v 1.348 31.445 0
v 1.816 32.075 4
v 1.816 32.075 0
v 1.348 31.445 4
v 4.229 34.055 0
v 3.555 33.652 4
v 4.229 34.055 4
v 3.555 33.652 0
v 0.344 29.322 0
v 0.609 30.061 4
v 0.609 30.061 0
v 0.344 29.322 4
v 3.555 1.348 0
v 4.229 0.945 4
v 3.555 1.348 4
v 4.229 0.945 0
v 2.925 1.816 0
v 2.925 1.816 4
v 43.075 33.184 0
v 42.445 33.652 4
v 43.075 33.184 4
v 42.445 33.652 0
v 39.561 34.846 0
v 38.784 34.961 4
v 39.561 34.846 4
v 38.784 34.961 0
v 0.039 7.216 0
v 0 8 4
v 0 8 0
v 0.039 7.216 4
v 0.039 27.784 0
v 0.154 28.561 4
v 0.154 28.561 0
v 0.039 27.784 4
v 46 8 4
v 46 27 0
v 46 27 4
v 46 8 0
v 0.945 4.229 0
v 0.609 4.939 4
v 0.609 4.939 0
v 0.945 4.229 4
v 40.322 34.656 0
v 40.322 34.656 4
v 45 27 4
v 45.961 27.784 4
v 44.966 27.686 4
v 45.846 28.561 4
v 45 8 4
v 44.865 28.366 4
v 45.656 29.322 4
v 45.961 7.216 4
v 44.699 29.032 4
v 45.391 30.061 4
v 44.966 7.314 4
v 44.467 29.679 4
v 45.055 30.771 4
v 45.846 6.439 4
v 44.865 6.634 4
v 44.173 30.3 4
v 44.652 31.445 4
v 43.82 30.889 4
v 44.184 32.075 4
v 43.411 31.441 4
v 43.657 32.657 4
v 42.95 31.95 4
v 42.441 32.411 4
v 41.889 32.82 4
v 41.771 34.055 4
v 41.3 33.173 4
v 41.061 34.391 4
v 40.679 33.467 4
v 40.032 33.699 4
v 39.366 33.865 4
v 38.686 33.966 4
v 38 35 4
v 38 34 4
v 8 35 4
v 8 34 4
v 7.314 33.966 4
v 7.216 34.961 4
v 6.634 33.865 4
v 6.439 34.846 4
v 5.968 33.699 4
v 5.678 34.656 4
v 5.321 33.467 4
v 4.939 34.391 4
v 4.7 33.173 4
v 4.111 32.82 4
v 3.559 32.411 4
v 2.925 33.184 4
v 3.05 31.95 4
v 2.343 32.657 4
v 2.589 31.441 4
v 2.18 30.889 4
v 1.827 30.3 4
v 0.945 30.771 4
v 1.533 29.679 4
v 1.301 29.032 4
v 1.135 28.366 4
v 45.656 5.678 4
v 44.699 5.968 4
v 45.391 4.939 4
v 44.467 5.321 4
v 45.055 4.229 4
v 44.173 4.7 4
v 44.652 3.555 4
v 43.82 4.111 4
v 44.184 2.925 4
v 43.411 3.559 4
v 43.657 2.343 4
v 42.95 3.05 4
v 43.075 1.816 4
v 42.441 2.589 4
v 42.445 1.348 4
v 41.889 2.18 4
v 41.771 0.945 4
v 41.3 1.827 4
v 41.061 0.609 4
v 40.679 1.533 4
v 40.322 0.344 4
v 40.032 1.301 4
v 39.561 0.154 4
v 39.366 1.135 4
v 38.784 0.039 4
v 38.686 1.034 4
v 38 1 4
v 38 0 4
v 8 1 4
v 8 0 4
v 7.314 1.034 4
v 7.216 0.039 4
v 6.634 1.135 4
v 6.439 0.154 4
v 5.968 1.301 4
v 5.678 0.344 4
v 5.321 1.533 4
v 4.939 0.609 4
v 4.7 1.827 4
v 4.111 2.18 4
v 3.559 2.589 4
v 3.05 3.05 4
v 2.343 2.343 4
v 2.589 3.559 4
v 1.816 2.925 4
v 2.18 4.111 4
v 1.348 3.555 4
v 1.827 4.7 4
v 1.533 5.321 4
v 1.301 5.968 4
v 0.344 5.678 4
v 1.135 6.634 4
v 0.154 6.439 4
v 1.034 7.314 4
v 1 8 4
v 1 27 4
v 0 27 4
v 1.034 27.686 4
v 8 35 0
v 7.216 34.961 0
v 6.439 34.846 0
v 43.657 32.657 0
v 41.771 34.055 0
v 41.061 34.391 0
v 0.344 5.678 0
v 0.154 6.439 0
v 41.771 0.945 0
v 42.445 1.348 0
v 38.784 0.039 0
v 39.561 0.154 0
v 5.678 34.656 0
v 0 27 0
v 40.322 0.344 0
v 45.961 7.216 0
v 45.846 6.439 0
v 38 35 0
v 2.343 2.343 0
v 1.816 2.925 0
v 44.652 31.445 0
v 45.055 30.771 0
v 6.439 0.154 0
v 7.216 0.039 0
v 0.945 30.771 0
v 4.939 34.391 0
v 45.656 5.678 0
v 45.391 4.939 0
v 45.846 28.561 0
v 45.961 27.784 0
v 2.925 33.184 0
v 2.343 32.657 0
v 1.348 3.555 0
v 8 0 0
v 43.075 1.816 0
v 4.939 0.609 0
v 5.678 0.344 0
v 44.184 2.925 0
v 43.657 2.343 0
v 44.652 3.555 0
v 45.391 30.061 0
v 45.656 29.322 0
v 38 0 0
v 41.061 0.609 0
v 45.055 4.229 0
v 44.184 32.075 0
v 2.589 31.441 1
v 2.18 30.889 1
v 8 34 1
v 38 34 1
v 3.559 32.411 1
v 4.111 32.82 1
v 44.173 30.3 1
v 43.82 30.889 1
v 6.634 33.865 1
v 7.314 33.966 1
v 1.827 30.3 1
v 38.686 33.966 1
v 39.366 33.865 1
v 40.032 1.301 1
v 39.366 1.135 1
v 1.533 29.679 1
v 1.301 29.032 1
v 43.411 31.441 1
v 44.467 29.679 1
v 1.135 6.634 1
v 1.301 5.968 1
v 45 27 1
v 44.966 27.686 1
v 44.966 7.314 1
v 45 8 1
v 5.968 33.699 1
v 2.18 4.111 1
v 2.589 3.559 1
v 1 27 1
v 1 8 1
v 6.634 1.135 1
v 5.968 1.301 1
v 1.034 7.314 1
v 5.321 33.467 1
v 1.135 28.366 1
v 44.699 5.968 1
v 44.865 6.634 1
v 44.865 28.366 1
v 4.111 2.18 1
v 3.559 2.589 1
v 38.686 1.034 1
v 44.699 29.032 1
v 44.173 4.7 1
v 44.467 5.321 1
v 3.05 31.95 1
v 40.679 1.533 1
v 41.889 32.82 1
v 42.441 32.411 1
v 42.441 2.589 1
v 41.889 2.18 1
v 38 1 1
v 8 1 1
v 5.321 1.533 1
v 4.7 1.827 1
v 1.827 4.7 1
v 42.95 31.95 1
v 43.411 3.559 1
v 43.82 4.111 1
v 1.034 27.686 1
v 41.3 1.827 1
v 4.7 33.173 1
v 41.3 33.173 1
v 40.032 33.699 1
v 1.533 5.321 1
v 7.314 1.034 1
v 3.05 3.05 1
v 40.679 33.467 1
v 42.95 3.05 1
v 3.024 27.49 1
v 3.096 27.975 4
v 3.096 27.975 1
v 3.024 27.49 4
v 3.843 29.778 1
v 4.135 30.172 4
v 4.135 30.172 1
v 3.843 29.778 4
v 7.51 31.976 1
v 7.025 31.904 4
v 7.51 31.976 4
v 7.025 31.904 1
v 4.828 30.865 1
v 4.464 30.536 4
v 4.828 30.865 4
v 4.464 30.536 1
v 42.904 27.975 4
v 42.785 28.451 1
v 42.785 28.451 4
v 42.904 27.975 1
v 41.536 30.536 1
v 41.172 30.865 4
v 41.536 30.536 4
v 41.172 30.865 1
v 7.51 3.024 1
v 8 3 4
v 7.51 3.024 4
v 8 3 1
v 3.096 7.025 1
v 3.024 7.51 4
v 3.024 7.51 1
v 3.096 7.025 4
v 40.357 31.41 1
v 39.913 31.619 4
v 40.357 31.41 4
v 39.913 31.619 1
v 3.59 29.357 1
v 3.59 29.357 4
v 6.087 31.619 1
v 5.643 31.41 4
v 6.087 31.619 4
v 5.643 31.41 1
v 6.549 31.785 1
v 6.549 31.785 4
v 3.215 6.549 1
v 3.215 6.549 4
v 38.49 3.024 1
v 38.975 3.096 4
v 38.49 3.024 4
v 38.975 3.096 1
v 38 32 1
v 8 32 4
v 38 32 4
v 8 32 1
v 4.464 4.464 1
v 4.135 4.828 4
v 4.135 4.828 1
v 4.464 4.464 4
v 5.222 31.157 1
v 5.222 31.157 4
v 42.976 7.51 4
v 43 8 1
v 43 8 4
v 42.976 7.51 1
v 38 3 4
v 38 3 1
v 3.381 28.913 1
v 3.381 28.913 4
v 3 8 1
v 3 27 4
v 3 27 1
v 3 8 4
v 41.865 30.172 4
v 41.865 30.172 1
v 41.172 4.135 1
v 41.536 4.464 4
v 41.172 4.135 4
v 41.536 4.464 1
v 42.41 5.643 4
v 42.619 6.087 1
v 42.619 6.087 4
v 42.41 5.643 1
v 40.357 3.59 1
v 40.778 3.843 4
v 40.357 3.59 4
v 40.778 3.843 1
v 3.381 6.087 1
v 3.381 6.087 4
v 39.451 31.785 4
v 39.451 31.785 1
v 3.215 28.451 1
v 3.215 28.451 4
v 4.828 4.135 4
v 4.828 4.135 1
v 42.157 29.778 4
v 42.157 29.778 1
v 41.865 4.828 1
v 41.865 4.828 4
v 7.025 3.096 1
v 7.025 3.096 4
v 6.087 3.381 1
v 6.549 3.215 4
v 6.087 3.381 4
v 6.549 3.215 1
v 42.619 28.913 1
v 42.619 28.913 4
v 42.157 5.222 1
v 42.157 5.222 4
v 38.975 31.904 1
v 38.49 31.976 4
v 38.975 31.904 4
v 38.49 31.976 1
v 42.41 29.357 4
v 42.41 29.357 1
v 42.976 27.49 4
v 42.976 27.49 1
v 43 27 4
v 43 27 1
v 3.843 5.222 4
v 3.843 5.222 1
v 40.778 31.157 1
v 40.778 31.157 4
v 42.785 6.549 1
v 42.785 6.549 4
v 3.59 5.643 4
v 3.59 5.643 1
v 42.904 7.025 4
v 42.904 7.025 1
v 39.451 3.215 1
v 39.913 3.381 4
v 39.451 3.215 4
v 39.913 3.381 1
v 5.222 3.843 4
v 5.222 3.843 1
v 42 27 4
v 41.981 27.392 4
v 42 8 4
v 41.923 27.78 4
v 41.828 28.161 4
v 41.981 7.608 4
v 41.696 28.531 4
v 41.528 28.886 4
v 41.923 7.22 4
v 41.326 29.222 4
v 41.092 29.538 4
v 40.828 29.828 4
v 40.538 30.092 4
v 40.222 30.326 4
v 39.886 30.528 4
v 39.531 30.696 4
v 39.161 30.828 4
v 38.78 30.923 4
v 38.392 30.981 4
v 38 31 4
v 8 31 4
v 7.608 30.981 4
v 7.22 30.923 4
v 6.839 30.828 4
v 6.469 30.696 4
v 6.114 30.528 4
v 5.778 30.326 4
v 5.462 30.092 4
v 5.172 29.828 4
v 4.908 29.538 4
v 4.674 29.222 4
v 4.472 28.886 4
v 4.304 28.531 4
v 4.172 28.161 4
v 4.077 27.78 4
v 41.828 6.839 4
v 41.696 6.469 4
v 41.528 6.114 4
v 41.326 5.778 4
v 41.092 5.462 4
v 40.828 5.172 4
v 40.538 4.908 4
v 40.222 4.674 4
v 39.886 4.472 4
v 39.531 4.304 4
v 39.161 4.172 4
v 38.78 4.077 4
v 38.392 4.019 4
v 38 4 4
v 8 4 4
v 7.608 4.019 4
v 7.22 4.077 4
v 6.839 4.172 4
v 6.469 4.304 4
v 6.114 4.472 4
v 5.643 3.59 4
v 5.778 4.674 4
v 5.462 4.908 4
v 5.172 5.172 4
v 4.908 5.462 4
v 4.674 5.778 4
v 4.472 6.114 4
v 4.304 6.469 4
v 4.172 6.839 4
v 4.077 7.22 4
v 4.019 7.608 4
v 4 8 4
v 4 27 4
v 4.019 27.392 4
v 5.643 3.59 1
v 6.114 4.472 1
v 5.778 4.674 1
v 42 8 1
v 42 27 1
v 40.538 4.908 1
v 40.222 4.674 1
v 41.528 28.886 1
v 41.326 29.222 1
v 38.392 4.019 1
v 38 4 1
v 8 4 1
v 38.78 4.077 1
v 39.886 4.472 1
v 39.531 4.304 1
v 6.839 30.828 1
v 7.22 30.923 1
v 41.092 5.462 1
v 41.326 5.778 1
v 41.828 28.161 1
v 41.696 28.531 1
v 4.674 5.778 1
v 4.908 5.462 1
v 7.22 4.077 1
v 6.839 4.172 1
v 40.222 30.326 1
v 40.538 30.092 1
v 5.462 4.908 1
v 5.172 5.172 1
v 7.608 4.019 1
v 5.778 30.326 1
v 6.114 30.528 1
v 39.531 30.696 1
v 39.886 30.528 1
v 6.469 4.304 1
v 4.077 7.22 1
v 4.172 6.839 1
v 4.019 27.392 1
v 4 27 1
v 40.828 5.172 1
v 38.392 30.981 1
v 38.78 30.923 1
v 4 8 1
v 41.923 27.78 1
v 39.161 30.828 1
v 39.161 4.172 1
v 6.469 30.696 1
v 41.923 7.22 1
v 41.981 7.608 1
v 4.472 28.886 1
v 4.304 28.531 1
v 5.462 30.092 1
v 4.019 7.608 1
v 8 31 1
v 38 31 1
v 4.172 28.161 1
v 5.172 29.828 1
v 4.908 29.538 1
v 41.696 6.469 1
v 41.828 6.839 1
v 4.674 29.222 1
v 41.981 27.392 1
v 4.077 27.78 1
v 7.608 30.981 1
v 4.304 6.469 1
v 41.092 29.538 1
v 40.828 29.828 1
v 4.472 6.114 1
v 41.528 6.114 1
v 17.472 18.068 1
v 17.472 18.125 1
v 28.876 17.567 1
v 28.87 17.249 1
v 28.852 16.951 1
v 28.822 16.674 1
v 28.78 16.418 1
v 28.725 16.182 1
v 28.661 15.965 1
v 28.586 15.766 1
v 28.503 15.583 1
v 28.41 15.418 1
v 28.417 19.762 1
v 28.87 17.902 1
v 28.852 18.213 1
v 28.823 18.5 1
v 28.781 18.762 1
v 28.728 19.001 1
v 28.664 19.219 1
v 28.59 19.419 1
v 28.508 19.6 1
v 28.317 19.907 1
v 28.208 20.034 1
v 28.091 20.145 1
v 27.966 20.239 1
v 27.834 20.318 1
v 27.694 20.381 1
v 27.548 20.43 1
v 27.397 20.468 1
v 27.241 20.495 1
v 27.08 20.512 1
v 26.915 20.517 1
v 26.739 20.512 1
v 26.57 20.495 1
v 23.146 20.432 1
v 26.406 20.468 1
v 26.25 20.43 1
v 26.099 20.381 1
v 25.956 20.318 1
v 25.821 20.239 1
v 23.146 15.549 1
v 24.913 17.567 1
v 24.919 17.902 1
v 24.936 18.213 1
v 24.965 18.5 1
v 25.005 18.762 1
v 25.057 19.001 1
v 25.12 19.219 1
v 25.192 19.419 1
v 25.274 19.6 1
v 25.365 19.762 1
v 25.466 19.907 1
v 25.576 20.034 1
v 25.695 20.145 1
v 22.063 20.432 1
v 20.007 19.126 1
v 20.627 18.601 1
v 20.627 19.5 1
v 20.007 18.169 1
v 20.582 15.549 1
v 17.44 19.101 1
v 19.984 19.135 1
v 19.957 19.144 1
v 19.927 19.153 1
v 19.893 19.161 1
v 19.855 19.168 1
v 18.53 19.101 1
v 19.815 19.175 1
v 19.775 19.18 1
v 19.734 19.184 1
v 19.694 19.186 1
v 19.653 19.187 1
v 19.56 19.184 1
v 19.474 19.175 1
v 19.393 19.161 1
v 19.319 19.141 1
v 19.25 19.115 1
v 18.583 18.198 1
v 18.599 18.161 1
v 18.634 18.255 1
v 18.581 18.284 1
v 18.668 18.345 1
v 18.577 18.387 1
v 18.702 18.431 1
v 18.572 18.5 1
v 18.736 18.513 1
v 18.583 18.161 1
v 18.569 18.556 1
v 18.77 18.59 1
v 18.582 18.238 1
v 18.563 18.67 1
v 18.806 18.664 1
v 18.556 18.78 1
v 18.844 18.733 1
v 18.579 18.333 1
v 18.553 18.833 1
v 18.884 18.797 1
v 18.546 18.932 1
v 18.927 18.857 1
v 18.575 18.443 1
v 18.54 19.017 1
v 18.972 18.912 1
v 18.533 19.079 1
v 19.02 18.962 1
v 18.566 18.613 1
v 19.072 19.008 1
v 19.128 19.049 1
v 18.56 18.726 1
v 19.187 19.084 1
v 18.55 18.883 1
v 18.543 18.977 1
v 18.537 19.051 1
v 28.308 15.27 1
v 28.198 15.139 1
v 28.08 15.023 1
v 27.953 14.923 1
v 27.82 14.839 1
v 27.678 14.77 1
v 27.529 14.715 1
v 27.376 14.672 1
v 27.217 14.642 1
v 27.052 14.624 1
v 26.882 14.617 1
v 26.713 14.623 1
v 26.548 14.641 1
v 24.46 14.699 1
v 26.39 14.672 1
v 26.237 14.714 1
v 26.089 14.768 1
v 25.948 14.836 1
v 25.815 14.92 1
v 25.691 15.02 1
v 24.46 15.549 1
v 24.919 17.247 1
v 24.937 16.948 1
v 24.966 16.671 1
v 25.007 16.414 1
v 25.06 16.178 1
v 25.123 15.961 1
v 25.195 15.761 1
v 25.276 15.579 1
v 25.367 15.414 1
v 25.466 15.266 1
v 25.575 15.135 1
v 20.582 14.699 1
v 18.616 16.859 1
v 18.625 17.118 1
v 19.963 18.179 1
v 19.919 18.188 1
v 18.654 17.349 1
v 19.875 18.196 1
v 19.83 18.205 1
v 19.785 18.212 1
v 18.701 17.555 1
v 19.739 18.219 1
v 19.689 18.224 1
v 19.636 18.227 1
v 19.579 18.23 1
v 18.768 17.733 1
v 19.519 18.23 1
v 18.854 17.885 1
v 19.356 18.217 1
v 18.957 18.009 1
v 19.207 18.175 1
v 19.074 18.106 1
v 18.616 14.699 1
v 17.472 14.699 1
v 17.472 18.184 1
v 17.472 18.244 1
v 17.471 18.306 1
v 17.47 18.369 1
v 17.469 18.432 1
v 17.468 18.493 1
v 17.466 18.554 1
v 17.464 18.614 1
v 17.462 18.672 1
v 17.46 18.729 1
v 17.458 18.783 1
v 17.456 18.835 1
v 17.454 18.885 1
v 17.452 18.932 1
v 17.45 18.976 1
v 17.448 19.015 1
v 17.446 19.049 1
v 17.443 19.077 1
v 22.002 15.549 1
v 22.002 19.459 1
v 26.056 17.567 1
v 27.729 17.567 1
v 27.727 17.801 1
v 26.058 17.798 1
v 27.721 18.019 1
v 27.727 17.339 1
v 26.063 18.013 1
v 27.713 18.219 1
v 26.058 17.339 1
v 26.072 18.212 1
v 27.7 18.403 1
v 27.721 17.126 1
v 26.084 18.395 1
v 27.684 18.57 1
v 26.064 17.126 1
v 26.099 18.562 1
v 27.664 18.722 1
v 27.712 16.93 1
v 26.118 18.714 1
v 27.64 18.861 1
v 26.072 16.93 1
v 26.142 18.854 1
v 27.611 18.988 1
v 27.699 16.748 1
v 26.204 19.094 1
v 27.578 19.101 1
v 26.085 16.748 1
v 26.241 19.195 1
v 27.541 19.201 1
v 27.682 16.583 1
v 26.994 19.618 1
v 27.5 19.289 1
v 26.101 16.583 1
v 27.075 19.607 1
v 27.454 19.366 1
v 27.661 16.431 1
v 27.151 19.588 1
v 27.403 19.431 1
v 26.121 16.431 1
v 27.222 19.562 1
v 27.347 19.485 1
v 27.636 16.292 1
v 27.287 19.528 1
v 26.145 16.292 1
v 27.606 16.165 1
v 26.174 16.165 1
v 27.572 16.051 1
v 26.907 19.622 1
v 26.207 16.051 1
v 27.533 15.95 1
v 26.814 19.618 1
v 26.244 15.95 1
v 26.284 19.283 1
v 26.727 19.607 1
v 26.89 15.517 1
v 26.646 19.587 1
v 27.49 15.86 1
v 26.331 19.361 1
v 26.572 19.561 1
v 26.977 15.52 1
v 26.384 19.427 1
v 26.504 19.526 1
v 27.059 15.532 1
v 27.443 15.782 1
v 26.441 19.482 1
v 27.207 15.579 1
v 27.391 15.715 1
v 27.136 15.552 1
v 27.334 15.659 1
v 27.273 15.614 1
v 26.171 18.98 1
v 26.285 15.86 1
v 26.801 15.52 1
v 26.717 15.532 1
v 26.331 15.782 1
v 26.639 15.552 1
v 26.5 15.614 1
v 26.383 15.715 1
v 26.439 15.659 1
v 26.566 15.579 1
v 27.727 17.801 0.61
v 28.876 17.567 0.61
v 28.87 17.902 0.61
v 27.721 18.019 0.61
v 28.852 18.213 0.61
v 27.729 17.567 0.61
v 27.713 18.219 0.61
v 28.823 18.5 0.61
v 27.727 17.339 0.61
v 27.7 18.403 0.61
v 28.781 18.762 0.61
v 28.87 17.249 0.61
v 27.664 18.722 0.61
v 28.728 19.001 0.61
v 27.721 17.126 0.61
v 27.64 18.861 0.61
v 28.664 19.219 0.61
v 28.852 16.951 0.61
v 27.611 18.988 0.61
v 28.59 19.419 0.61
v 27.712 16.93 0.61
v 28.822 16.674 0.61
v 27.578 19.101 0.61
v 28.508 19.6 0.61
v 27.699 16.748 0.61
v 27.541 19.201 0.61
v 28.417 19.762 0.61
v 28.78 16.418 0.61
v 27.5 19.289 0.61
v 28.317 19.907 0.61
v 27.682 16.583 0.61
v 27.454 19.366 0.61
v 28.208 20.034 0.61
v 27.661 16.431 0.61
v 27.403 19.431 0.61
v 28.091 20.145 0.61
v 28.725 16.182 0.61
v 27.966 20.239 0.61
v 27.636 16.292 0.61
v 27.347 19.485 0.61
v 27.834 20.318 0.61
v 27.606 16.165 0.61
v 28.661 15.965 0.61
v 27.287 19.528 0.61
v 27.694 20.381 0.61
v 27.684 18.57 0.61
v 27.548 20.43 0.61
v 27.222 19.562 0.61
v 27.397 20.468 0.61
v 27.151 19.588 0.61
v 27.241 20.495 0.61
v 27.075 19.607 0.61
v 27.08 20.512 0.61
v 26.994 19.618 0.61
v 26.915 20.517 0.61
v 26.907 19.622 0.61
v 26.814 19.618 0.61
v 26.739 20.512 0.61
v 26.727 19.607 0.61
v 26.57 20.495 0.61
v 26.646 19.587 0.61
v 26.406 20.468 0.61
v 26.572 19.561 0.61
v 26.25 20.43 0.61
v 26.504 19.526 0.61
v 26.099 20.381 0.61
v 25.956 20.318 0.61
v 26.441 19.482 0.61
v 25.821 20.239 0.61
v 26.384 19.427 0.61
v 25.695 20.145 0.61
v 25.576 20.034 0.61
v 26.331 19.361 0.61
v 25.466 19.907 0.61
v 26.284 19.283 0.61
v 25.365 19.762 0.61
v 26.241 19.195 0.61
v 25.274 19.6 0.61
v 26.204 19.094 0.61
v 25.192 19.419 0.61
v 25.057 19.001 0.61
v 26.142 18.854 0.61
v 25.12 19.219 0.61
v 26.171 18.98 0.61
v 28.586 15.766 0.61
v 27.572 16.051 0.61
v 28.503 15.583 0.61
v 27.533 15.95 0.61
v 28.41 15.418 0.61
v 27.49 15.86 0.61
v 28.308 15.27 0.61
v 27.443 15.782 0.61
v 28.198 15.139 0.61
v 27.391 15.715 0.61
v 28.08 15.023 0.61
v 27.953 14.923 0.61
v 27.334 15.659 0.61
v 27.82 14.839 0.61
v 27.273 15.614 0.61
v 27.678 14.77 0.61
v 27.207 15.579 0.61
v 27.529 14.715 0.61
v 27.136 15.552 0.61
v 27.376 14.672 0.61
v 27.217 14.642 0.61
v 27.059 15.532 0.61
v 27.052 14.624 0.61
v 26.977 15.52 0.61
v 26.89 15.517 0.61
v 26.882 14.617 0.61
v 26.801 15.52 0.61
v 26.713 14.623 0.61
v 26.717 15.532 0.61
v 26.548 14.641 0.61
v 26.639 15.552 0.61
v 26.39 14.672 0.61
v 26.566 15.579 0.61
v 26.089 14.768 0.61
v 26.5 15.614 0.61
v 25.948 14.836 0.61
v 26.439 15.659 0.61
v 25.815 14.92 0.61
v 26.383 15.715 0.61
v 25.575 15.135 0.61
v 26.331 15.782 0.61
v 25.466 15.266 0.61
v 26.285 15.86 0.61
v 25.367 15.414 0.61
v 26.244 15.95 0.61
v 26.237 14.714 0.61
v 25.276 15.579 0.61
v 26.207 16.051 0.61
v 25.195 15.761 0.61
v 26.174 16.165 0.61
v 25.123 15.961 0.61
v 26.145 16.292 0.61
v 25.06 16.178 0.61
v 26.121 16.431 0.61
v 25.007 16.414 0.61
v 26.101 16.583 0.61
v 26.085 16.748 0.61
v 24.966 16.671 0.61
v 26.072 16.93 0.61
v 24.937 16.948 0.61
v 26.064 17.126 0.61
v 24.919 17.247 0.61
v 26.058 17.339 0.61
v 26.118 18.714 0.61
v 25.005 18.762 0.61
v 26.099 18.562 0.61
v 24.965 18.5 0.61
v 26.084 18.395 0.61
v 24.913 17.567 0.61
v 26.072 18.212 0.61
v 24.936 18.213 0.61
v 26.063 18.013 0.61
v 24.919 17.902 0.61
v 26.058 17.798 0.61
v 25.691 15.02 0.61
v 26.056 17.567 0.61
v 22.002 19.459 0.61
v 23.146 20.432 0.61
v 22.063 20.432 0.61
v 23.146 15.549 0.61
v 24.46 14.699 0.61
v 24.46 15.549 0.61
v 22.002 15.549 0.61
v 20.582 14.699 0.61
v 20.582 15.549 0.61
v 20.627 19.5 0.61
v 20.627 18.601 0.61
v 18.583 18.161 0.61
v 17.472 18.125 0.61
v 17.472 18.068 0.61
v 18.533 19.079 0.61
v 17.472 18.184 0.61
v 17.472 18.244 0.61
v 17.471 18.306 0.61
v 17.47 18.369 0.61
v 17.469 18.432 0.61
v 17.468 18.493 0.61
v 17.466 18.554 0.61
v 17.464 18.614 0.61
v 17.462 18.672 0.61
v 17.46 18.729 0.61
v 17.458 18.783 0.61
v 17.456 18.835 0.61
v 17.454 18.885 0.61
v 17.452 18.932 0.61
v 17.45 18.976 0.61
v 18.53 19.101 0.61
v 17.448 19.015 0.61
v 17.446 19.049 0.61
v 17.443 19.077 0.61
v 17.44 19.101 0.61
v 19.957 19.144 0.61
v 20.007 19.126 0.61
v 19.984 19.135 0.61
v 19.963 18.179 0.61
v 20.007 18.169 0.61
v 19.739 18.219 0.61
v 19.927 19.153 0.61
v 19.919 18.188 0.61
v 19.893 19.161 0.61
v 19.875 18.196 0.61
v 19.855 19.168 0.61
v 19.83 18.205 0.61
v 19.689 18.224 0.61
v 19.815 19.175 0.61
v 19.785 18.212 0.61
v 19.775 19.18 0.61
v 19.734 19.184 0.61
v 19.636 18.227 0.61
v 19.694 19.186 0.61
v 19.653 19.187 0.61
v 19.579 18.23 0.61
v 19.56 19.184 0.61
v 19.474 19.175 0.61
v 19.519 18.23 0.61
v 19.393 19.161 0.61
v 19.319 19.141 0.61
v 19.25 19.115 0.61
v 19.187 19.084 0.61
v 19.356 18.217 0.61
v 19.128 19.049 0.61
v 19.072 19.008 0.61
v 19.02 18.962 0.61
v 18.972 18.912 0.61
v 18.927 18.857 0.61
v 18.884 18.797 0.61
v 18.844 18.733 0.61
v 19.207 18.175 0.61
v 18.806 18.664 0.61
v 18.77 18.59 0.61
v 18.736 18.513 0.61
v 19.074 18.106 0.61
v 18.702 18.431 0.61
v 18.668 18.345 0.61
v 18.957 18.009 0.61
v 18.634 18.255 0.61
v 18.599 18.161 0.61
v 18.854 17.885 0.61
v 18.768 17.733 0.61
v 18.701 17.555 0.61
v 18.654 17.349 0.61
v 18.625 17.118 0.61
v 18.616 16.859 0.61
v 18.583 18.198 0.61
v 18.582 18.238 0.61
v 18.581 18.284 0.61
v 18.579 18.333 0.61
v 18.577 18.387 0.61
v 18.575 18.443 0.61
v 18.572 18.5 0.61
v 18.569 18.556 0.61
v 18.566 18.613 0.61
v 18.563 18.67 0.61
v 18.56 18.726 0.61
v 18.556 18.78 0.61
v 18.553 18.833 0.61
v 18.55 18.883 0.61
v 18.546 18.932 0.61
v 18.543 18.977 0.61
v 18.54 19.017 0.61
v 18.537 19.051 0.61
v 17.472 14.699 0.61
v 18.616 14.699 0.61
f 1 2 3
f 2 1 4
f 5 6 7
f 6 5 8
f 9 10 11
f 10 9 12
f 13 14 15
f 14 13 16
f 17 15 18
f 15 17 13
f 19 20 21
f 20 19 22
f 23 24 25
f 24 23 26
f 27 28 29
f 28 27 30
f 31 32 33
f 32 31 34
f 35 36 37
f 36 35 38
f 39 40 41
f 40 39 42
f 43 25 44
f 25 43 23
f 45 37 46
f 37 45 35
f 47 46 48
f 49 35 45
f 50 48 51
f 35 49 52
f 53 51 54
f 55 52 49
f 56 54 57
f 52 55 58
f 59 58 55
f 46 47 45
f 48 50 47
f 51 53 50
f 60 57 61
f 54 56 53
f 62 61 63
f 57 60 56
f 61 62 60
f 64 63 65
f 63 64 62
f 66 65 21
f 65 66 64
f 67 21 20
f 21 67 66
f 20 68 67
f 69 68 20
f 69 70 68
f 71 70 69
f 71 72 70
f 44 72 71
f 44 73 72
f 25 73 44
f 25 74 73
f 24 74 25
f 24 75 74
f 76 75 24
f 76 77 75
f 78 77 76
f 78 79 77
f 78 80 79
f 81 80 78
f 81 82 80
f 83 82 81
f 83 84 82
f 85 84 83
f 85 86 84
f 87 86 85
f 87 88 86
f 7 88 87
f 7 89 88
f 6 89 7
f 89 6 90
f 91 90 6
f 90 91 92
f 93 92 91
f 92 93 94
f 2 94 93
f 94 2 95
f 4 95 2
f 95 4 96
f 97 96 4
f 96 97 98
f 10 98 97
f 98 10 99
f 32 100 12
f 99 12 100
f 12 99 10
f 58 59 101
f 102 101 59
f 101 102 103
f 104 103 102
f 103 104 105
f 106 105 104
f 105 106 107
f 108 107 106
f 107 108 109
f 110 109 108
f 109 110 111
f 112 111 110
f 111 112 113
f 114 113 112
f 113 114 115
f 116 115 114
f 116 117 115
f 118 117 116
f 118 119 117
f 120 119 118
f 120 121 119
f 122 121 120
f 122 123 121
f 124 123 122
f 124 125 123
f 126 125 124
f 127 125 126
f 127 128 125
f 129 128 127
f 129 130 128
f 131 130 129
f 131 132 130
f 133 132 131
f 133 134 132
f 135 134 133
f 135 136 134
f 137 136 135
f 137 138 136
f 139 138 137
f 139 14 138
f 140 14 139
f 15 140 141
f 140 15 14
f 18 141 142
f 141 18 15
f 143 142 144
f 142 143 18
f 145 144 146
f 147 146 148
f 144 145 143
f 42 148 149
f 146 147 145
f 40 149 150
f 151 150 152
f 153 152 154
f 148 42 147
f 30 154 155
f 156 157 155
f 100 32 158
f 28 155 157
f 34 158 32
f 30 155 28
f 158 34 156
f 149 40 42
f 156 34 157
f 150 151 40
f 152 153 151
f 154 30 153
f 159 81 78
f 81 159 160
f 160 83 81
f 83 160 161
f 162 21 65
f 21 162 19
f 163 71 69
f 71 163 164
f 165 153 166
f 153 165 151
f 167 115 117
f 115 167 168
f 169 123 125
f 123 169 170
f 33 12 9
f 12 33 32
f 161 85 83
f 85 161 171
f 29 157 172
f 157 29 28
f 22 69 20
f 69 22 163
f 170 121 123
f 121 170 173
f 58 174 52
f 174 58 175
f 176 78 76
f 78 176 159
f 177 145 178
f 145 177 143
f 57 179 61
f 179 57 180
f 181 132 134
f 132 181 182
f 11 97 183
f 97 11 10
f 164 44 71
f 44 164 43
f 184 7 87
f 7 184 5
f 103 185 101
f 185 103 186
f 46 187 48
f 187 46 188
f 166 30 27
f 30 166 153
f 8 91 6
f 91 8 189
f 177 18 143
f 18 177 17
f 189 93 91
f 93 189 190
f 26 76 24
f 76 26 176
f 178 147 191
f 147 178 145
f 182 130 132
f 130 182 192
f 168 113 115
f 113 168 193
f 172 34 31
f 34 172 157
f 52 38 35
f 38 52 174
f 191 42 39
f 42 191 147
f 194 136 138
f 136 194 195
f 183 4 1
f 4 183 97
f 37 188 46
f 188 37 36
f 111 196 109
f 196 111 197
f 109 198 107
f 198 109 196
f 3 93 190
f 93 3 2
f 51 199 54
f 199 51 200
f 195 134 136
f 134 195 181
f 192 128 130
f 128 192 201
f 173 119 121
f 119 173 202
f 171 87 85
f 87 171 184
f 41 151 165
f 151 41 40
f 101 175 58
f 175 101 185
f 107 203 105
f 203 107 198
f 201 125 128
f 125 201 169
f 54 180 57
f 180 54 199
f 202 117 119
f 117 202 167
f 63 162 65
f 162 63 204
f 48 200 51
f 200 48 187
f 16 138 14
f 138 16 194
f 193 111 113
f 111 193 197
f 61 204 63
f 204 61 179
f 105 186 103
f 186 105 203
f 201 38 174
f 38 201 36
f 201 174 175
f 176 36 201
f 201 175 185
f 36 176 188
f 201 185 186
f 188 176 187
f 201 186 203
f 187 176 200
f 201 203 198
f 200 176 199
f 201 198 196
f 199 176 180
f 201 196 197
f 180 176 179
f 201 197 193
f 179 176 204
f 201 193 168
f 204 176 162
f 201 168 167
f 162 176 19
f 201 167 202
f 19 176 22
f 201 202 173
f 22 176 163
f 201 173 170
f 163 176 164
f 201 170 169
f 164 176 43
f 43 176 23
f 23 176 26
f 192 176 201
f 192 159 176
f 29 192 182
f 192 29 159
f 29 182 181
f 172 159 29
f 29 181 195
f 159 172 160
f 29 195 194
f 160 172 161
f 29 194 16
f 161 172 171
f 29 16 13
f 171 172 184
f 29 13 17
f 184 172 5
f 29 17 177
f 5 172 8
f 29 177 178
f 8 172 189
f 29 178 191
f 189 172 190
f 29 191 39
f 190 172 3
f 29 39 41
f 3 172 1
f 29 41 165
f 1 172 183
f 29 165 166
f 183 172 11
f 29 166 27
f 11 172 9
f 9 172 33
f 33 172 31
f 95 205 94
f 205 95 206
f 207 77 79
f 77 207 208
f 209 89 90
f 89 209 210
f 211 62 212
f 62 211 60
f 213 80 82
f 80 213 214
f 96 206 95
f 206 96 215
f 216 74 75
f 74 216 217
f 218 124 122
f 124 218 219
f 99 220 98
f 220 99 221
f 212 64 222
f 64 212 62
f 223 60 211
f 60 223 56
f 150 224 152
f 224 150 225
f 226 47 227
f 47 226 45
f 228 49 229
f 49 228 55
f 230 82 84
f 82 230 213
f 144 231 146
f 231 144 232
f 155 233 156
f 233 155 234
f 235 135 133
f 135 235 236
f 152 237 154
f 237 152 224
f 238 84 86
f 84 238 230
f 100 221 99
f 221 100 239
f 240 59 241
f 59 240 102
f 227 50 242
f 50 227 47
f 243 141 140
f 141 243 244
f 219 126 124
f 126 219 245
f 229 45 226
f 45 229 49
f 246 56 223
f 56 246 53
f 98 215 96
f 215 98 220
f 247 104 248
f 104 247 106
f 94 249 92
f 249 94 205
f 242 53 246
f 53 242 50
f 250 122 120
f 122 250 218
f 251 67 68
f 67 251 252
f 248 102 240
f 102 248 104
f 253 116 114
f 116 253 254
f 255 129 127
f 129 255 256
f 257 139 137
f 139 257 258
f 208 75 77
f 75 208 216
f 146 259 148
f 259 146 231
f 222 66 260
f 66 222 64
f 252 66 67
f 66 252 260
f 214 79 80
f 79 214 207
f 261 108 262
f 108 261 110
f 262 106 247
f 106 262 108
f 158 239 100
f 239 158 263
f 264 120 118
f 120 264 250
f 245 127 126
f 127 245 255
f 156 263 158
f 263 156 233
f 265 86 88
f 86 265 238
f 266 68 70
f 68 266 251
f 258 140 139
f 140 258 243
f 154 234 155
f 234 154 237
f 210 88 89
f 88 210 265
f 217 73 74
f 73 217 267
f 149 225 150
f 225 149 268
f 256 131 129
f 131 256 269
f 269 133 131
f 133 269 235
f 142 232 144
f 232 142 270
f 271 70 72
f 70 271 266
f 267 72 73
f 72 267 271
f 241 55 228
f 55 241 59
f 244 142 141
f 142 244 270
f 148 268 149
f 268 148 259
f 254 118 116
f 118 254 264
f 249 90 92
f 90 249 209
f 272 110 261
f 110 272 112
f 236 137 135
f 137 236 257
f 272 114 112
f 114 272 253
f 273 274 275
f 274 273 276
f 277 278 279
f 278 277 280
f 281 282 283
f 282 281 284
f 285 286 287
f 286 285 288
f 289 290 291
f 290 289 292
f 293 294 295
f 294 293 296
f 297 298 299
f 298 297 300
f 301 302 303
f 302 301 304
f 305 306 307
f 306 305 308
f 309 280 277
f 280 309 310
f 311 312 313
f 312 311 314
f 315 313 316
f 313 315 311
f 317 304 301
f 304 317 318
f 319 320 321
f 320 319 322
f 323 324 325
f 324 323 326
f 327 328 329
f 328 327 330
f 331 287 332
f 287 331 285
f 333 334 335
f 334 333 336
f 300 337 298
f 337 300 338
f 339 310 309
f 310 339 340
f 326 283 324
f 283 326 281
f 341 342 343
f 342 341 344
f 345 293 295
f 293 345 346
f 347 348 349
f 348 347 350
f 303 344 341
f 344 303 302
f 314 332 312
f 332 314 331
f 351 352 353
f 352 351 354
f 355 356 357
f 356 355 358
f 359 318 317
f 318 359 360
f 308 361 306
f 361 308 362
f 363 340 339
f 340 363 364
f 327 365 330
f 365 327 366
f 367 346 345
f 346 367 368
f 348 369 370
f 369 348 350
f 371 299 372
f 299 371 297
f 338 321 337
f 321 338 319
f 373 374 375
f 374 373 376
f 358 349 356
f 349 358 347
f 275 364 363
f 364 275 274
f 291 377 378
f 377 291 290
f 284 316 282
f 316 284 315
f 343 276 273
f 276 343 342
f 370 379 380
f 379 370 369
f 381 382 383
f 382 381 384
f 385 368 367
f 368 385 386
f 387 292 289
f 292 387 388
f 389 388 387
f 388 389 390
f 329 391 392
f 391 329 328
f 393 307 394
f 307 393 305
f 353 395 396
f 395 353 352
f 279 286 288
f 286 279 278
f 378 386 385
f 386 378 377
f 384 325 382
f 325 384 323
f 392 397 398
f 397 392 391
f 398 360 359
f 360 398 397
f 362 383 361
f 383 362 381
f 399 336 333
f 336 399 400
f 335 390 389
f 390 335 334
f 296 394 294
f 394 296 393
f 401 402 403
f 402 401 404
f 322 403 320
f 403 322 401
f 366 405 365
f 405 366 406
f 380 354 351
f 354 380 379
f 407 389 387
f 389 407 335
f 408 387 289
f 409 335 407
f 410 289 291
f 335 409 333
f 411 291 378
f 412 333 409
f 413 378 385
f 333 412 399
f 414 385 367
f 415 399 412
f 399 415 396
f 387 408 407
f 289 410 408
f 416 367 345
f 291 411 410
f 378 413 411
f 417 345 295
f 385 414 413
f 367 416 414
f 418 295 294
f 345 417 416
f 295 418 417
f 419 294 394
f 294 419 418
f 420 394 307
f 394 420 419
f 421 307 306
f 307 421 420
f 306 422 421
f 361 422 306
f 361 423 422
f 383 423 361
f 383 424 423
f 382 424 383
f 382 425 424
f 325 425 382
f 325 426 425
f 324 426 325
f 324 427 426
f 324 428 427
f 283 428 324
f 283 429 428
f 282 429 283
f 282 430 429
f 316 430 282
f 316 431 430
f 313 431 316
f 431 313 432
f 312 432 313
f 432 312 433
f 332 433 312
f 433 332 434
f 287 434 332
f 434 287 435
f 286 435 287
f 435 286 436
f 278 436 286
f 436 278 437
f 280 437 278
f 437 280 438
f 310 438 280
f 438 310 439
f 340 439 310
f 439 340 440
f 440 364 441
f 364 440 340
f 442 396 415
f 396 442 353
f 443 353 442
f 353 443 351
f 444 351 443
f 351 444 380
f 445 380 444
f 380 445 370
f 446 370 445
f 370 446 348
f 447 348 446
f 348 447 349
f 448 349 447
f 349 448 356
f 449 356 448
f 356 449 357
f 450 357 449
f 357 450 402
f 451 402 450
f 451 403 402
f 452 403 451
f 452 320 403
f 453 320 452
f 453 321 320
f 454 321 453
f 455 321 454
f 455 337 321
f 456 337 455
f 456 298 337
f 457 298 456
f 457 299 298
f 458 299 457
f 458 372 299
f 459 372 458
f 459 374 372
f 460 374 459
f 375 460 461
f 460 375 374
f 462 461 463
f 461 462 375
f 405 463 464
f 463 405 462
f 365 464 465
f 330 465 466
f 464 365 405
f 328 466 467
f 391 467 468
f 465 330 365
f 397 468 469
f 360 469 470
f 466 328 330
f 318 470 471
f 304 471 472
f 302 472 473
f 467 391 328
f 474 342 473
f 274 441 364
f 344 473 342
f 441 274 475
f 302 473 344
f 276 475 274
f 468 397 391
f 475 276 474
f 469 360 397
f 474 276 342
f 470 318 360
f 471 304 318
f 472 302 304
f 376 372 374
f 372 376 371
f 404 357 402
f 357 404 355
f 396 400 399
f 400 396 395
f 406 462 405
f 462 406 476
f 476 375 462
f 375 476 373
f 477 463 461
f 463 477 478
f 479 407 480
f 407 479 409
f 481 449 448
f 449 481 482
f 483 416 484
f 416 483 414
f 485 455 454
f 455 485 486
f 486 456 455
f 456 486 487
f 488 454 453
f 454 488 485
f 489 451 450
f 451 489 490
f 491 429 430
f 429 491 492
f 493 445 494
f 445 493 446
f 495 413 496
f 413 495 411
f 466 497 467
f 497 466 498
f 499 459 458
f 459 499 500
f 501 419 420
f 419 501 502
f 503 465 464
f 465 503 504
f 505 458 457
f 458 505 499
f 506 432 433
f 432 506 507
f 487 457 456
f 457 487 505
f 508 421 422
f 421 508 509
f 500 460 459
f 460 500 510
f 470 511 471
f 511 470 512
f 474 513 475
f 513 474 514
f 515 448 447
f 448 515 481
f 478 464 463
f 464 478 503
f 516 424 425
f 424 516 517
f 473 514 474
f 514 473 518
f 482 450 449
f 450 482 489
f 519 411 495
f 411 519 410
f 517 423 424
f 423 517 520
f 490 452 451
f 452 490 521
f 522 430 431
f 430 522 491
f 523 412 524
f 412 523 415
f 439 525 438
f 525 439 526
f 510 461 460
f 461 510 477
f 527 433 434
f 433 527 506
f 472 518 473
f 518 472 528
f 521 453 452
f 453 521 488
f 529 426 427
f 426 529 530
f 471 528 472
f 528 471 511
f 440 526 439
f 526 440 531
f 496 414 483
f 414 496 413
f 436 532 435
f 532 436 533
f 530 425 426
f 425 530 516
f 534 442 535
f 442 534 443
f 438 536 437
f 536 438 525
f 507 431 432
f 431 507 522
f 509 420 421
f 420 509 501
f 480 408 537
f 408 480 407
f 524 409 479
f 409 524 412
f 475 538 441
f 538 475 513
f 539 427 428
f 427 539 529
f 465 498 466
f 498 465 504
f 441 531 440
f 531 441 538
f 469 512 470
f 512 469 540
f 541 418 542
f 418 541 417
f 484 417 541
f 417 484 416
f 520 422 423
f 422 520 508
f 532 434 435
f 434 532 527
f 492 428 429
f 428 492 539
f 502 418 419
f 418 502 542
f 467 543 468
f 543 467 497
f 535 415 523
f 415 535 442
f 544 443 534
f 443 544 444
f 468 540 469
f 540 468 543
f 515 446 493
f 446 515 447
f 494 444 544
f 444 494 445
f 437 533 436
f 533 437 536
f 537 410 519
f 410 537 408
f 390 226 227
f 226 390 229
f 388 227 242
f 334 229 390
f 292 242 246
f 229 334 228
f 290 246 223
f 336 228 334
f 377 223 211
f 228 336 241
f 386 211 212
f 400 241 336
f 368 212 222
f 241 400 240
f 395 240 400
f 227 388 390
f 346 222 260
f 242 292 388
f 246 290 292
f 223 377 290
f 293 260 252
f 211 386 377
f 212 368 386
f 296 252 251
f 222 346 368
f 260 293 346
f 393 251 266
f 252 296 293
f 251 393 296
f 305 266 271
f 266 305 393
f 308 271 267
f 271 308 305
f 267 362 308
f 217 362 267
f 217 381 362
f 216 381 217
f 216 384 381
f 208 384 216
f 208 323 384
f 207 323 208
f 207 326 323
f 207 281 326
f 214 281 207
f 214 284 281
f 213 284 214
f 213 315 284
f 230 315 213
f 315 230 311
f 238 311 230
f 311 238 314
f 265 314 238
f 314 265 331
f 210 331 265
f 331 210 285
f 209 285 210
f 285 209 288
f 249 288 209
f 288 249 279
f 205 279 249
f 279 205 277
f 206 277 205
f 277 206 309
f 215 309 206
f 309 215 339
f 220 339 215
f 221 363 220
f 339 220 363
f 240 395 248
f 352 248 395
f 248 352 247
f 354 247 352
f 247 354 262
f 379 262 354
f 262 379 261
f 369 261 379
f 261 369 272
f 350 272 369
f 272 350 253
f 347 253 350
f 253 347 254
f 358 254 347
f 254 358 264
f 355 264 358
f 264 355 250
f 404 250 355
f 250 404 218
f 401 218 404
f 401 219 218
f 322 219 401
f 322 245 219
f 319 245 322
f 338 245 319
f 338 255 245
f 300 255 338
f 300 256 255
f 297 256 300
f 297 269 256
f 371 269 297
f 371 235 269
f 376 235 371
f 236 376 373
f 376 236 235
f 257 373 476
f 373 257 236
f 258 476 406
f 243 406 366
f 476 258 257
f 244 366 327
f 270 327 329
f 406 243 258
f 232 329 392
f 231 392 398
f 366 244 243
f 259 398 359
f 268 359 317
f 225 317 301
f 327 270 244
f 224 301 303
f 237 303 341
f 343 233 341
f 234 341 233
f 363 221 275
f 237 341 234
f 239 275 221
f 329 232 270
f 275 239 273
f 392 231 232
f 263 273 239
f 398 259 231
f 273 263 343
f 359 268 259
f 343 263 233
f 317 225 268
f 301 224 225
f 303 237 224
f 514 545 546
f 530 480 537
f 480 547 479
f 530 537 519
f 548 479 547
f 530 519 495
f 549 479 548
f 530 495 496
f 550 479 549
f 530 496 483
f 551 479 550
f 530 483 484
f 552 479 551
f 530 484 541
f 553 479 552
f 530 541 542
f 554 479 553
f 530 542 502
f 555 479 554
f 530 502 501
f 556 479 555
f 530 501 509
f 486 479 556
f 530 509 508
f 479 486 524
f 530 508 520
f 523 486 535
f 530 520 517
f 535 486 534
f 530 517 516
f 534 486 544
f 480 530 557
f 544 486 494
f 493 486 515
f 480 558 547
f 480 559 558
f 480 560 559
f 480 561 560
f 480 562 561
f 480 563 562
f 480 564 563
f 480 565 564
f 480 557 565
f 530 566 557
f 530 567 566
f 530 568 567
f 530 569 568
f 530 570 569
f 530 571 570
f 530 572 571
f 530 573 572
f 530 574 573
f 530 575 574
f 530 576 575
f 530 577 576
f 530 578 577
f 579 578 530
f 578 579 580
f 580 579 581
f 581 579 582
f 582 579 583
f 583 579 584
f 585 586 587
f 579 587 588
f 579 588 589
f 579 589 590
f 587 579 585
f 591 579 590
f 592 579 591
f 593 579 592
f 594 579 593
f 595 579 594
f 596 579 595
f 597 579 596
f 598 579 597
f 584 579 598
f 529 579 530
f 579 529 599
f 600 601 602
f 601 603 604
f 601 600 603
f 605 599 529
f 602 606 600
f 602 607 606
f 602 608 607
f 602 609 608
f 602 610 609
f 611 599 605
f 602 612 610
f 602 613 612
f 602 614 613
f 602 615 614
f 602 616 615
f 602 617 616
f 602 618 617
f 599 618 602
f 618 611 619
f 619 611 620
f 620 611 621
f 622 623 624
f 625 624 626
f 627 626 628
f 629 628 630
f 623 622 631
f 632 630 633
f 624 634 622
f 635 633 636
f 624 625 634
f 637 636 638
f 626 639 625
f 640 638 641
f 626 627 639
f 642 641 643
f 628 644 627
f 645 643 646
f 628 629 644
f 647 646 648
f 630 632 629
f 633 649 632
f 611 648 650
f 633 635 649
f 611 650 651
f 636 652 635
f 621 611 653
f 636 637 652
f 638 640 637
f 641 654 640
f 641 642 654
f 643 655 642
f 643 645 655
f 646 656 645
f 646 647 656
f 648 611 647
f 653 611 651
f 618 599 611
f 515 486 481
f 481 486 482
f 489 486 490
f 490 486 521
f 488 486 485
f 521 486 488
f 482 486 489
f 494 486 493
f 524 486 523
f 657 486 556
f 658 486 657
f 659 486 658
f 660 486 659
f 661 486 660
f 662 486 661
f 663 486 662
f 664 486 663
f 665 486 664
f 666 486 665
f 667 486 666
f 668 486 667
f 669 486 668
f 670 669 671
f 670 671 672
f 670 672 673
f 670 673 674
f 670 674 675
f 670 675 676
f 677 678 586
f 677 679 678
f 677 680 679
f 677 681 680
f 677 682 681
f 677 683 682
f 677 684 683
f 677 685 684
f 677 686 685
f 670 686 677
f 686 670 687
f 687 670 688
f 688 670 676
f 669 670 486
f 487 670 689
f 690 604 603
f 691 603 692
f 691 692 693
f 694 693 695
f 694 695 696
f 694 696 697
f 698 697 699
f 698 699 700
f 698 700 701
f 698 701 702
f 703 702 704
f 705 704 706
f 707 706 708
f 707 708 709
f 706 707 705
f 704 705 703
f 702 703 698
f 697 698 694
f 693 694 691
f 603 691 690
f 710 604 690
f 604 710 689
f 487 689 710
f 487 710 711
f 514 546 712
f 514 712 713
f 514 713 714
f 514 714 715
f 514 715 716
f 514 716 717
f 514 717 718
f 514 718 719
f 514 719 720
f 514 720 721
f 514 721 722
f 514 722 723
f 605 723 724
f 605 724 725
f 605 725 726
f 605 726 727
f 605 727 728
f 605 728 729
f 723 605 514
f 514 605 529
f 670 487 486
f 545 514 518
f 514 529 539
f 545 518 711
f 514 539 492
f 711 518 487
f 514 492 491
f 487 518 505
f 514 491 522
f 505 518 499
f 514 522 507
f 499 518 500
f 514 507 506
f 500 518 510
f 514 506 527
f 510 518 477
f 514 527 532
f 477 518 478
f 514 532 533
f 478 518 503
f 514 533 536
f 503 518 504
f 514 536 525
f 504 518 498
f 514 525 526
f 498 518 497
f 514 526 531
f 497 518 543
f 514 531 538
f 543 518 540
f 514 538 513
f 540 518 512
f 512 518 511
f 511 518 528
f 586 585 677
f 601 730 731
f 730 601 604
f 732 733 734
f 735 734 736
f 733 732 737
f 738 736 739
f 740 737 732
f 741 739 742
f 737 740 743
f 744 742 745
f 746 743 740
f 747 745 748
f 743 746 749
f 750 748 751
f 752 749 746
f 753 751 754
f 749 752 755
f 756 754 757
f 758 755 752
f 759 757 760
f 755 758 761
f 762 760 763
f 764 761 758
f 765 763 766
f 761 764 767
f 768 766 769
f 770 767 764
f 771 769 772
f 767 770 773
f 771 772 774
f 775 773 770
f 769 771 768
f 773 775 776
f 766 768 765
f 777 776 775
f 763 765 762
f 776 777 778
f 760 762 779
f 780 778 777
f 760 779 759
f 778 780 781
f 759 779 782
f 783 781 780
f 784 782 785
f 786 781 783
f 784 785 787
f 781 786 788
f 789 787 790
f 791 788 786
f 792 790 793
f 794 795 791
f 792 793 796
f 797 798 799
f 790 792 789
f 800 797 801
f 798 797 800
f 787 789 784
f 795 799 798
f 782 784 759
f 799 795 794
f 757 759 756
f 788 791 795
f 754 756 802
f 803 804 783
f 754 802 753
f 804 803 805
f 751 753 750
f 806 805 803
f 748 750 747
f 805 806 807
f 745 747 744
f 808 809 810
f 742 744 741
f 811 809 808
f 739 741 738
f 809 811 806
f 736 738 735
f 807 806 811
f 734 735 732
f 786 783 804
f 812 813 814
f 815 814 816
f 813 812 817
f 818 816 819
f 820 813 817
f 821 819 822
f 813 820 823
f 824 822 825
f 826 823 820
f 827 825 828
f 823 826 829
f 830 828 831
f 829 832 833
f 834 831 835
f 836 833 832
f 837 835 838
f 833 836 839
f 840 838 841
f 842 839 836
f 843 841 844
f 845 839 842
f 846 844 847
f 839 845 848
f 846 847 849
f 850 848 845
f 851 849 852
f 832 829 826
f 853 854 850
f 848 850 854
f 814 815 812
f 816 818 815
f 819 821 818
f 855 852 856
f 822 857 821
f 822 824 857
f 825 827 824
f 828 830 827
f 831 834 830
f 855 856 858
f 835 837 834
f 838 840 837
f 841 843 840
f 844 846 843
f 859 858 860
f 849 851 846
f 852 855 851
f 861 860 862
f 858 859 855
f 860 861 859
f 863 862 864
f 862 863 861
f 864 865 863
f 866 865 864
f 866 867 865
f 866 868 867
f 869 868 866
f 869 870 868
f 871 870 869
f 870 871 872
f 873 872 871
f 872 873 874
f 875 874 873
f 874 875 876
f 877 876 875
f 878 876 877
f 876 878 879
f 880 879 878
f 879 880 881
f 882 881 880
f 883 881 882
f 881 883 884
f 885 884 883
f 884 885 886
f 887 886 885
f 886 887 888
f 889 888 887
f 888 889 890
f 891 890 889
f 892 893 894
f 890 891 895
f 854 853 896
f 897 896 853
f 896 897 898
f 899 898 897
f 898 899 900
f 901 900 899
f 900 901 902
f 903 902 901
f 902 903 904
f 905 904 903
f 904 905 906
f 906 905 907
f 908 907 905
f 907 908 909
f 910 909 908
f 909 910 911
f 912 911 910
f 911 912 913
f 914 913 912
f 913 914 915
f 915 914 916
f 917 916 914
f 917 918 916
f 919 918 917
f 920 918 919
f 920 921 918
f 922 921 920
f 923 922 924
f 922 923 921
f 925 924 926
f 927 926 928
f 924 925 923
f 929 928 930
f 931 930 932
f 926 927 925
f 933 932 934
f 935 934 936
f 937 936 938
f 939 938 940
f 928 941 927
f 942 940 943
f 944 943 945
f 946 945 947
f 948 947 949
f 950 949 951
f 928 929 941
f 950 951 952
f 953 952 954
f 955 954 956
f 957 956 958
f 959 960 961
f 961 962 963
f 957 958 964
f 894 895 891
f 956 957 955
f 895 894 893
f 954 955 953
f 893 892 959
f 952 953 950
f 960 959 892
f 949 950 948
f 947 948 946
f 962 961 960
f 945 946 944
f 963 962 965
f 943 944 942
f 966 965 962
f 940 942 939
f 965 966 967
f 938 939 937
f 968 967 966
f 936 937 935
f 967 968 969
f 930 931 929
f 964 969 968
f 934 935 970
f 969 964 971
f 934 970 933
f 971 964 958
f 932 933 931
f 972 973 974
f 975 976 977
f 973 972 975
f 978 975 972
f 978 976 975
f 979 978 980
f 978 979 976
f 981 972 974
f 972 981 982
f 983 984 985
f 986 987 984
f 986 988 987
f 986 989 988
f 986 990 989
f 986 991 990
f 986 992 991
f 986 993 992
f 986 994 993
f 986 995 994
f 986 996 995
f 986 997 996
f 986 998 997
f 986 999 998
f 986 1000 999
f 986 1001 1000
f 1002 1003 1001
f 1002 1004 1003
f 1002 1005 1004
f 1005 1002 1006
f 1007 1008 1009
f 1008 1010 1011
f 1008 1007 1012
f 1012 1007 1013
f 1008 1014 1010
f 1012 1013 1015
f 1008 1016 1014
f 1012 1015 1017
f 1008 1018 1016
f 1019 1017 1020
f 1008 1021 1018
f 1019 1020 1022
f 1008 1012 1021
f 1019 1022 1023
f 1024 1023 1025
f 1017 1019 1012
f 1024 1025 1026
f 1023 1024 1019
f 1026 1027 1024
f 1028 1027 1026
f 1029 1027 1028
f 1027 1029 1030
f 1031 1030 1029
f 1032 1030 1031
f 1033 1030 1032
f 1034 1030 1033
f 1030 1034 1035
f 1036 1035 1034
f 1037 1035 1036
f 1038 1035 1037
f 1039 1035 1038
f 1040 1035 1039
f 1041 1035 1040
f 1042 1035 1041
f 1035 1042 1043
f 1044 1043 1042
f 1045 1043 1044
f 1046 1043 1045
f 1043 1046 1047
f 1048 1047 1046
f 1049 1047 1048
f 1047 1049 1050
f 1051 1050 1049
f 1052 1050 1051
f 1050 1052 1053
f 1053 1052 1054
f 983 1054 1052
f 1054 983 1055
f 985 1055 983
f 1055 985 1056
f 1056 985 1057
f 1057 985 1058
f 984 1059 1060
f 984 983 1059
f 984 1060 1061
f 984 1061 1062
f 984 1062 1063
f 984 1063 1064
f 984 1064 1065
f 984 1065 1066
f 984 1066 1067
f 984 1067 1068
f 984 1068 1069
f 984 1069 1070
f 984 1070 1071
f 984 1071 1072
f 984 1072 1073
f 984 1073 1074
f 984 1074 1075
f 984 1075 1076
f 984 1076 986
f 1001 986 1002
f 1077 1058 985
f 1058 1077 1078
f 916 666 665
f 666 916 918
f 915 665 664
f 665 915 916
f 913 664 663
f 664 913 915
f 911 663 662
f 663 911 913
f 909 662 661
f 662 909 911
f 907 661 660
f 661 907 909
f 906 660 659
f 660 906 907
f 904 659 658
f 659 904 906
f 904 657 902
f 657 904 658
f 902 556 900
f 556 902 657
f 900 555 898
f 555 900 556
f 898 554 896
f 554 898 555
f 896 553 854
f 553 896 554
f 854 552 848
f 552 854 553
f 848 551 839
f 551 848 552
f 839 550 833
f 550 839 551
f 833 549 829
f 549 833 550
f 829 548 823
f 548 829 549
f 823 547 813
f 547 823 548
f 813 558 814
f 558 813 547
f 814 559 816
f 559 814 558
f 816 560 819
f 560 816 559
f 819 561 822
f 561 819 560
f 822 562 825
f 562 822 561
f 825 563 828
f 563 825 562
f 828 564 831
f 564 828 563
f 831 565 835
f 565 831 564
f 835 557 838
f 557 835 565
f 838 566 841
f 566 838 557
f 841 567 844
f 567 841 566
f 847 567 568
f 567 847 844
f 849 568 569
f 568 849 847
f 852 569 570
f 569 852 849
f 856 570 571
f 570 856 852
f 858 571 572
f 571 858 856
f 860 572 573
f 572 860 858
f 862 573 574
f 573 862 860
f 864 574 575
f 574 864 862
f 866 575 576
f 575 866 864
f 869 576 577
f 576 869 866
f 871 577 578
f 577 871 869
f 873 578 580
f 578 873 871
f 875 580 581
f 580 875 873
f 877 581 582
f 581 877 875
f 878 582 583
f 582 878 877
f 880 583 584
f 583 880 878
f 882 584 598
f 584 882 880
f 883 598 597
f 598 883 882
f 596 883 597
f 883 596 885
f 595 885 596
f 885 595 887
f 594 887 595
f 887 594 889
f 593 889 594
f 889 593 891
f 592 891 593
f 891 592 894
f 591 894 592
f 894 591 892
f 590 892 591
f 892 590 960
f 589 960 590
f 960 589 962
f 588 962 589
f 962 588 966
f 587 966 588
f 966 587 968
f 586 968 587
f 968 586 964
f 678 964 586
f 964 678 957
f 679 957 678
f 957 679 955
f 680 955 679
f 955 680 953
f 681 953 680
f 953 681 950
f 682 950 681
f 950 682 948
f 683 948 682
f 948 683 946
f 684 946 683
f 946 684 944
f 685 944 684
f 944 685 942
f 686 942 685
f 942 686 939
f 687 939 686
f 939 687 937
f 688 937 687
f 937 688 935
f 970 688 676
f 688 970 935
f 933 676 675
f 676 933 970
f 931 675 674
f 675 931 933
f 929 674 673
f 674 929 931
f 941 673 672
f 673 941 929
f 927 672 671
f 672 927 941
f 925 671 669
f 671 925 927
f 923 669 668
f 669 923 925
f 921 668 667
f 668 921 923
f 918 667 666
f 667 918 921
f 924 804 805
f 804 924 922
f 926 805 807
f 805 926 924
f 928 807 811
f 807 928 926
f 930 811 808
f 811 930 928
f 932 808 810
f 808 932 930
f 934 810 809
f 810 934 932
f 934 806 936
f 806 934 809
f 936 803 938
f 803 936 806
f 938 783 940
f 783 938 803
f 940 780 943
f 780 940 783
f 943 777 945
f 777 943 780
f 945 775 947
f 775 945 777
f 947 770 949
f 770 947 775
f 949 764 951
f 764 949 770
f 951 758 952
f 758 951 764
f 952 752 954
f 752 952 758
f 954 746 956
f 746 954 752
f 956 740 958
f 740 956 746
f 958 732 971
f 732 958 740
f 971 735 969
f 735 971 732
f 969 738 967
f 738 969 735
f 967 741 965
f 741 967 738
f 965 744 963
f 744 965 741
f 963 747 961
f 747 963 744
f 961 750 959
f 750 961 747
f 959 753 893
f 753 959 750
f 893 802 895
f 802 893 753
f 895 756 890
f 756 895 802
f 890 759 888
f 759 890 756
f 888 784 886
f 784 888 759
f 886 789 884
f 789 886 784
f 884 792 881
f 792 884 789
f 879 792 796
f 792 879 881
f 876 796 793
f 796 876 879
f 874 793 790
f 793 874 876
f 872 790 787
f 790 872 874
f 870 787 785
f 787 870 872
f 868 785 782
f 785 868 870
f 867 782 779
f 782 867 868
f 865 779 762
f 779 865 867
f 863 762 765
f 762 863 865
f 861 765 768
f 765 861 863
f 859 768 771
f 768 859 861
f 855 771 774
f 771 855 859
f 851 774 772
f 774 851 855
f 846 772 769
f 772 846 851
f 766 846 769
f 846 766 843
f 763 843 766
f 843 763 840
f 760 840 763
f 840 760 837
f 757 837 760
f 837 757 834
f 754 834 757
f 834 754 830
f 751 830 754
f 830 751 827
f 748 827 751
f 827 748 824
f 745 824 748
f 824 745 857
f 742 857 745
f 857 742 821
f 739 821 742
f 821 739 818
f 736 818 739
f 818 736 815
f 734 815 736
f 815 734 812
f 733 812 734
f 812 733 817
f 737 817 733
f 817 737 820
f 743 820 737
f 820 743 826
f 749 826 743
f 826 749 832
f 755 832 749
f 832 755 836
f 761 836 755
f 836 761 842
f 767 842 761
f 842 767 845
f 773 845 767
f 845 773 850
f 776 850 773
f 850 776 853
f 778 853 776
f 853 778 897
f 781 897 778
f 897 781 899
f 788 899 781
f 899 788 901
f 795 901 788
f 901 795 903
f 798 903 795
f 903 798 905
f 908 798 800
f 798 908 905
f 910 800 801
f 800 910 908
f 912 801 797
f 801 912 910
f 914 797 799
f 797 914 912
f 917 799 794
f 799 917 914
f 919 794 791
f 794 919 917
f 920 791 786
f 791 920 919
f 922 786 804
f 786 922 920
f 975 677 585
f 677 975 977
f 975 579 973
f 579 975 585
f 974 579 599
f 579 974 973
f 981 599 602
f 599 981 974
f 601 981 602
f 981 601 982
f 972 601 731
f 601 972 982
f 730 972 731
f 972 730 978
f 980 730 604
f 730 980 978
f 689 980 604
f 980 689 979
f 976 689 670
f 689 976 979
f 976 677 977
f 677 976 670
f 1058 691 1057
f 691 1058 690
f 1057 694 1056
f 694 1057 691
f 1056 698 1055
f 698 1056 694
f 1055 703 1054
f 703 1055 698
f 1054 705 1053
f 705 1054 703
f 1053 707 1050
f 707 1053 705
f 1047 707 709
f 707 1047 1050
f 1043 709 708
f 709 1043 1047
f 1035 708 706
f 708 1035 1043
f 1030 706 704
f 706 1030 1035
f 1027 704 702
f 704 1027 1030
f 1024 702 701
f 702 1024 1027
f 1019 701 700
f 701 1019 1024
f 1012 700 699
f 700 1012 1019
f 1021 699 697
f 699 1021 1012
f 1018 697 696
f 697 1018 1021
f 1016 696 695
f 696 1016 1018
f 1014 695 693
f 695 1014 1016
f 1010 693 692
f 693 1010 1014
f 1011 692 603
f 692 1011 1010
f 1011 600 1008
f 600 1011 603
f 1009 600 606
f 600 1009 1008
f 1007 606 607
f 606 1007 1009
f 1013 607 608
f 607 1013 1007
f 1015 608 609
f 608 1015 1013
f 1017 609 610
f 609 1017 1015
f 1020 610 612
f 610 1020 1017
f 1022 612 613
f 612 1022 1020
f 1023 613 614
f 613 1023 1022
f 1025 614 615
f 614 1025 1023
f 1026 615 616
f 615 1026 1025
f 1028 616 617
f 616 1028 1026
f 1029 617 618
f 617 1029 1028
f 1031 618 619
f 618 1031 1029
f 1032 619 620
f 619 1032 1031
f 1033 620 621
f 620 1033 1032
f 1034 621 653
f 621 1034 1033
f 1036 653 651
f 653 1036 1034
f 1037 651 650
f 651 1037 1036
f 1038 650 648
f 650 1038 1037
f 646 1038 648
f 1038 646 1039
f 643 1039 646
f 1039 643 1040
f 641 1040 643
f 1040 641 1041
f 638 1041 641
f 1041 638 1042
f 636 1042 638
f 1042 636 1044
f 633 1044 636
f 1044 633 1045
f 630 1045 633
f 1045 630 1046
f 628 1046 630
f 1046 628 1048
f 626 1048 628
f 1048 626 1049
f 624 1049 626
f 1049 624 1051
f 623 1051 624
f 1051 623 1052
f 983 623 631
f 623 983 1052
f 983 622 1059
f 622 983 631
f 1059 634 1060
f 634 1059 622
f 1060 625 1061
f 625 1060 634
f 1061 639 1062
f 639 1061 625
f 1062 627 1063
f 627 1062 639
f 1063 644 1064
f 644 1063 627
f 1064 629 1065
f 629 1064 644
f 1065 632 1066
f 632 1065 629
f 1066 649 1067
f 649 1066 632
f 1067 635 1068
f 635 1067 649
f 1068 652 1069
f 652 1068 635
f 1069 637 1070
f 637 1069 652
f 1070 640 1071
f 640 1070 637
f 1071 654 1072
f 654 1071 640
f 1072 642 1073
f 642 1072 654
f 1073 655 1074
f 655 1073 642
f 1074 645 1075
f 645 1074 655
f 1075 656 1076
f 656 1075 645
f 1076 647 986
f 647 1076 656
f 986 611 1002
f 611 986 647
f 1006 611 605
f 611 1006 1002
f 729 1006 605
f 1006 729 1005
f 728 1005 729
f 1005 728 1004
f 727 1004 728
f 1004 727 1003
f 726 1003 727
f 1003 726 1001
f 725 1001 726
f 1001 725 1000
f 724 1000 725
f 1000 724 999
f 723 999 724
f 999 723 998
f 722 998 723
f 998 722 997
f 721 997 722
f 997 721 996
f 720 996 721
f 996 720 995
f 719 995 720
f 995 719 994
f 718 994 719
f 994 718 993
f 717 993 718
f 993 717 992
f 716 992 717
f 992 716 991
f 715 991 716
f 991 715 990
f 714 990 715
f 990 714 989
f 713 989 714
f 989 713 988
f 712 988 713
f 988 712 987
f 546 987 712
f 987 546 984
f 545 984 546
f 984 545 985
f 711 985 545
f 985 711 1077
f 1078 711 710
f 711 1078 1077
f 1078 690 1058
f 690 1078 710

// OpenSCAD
// Rounded Rectangle Gasket - Hollow Center
// Revision: r10 (from r09 baseline)
// Changes: groove_width -1mm (3mm → 2mm)

// Parameters
outer_length = 46;          // mm (unchanged)
outer_width = 35;           // mm (unchanged)
height = 4;                 // mm (unchanged)
outer_lip_thickness = 1;    // mm (unchanged)
groove_width = 2;           // mm (CHANGED from 3mm, -1mm)
inner_lip_thickness = 1;    // mm (unchanged)
floor_thickness = 1;        // mm (unchanged)
corner_radius = 8;          // mm (unchanged)

// Revision stamp parameters
revision = "r10";
text_size = 6;
text_depth = 0.4;

// Calculated values
groove_depth = height - floor_thickness;
total_wall_distance = outer_lip_thickness + groove_width;

// Inner lip dimensions
inner_lip_outer_length = outer_length - (2 * total_wall_distance);
inner_lip_outer_width = outer_width - (2 * total_wall_distance);
inner_lip_inner_length = inner_lip_outer_length - (2 * inner_lip_thickness);
inner_lip_inner_width = inner_lip_outer_width - (2 * inner_lip_thickness);

// Center position for text
center_x = outer_length / 2;
center_y = outer_width / 2;

// Verification output
echo("===========================================");
echo("       VERIFICATION REPORT - r10");
echo("       (from r09 baseline)");
echo("===========================================");
echo("");
echo("--- CHANGED PARAMETER ---");
echo("Groove Width:", groove_width, "mm (was 3mm, -1mm)");
echo("");
echo("--- VERIFIED UNCHANGED (GAP DISTANCES) ---");
echo("Outer Lip Thickness:", outer_lip_thickness, "mm ✓");
echo("Inner Lip Thickness:", inner_lip_thickness, "mm ✓");
echo("");
echo("--- OTHER UNCHANGED ---");
echo("Outer Length:", outer_length, "mm ✓");
echo("Outer Width:", outer_width, "mm ✓");
echo("Height:", height, "mm ✓");
echo("Floor Thickness:", floor_thickness, "mm ✓");
echo("Corner Radius:", corner_radius, "mm ✓");
echo("");
echo("--- CALCULATED DIMENSIONS ---");
echo("Overall:", outer_length, "x", outer_width, "x", height, "mm");
echo("Total Wall Distance:", total_wall_distance, "mm (was 4mm, now 3mm)");
echo("Inner Lip Outer:", inner_lip_outer_length, "x", inner_lip_outer_width, "mm");
echo("Center Floor:", inner_lip_inner_length, "x", inner_lip_inner_width, "mm");
echo("Groove Depth:", groove_depth, "mm ✓");
echo("===========================================");

// Module for rounded rectangle
module rounded_rect(length, width, h, radius) {
    r = min(radius, length/2, width/2);

    hull() {
        translate([r, r, 0])
            cylinder(h=h, r=r, $fn=64);
        translate([length - r, r, 0])
            cylinder(h=h, r=r, $fn=64);
        translate([r, width - r, 0])
            cylinder(h=h, r=r, $fn=64);
        translate([length - r, width - r, 0])
            cylinder(h=h, r=r, $fn=64);
    }
}

// Main gasket construction
difference() {
    union() {
        // 1. Full base floor
        rounded_rect(outer_length, outer_width, floor_thickness, corner_radius);

        // 2. Outer lip
        difference() {
            rounded_rect(outer_length, outer_width, height, corner_radius);

            translate([outer_lip_thickness, outer_lip_thickness, -0.1])
                rounded_rect(
                    outer_length - 2*outer_lip_thickness,
                    outer_width - 2*outer_lip_thickness,
                    height + 0.2,
                    corner_radius - outer_lip_thickness
                );
        }

        // 3. Inner lip
        translate([total_wall_distance, total_wall_distance, 0])
        difference() {
            rounded_rect(
                inner_lip_outer_length,
                inner_lip_outer_width,
                height,
                max(0.5, corner_radius - total_wall_distance)
            );

            translate([inner_lip_thickness, inner_lip_thickness, -0.1])
                rounded_rect(
                    inner_lip_inner_length,
                    inner_lip_inner_width,
                    height + 0.2,
                    max(0.5, corner_radius - total_wall_distance - inner_lip_thickness)
                );
        }
    }

    // 4. Engrave revision number in center of floor
    translate([center_x, center_y, floor_thickness - text_depth + 0.01])
        linear_extrude(height = text_depth + 0.1)
            text(revision,
                 size = text_size,
                 font = "Liberation Sans:style=Bold",
                 halign = "center",
                 valign = "center",
                 $fn = 32);
}
